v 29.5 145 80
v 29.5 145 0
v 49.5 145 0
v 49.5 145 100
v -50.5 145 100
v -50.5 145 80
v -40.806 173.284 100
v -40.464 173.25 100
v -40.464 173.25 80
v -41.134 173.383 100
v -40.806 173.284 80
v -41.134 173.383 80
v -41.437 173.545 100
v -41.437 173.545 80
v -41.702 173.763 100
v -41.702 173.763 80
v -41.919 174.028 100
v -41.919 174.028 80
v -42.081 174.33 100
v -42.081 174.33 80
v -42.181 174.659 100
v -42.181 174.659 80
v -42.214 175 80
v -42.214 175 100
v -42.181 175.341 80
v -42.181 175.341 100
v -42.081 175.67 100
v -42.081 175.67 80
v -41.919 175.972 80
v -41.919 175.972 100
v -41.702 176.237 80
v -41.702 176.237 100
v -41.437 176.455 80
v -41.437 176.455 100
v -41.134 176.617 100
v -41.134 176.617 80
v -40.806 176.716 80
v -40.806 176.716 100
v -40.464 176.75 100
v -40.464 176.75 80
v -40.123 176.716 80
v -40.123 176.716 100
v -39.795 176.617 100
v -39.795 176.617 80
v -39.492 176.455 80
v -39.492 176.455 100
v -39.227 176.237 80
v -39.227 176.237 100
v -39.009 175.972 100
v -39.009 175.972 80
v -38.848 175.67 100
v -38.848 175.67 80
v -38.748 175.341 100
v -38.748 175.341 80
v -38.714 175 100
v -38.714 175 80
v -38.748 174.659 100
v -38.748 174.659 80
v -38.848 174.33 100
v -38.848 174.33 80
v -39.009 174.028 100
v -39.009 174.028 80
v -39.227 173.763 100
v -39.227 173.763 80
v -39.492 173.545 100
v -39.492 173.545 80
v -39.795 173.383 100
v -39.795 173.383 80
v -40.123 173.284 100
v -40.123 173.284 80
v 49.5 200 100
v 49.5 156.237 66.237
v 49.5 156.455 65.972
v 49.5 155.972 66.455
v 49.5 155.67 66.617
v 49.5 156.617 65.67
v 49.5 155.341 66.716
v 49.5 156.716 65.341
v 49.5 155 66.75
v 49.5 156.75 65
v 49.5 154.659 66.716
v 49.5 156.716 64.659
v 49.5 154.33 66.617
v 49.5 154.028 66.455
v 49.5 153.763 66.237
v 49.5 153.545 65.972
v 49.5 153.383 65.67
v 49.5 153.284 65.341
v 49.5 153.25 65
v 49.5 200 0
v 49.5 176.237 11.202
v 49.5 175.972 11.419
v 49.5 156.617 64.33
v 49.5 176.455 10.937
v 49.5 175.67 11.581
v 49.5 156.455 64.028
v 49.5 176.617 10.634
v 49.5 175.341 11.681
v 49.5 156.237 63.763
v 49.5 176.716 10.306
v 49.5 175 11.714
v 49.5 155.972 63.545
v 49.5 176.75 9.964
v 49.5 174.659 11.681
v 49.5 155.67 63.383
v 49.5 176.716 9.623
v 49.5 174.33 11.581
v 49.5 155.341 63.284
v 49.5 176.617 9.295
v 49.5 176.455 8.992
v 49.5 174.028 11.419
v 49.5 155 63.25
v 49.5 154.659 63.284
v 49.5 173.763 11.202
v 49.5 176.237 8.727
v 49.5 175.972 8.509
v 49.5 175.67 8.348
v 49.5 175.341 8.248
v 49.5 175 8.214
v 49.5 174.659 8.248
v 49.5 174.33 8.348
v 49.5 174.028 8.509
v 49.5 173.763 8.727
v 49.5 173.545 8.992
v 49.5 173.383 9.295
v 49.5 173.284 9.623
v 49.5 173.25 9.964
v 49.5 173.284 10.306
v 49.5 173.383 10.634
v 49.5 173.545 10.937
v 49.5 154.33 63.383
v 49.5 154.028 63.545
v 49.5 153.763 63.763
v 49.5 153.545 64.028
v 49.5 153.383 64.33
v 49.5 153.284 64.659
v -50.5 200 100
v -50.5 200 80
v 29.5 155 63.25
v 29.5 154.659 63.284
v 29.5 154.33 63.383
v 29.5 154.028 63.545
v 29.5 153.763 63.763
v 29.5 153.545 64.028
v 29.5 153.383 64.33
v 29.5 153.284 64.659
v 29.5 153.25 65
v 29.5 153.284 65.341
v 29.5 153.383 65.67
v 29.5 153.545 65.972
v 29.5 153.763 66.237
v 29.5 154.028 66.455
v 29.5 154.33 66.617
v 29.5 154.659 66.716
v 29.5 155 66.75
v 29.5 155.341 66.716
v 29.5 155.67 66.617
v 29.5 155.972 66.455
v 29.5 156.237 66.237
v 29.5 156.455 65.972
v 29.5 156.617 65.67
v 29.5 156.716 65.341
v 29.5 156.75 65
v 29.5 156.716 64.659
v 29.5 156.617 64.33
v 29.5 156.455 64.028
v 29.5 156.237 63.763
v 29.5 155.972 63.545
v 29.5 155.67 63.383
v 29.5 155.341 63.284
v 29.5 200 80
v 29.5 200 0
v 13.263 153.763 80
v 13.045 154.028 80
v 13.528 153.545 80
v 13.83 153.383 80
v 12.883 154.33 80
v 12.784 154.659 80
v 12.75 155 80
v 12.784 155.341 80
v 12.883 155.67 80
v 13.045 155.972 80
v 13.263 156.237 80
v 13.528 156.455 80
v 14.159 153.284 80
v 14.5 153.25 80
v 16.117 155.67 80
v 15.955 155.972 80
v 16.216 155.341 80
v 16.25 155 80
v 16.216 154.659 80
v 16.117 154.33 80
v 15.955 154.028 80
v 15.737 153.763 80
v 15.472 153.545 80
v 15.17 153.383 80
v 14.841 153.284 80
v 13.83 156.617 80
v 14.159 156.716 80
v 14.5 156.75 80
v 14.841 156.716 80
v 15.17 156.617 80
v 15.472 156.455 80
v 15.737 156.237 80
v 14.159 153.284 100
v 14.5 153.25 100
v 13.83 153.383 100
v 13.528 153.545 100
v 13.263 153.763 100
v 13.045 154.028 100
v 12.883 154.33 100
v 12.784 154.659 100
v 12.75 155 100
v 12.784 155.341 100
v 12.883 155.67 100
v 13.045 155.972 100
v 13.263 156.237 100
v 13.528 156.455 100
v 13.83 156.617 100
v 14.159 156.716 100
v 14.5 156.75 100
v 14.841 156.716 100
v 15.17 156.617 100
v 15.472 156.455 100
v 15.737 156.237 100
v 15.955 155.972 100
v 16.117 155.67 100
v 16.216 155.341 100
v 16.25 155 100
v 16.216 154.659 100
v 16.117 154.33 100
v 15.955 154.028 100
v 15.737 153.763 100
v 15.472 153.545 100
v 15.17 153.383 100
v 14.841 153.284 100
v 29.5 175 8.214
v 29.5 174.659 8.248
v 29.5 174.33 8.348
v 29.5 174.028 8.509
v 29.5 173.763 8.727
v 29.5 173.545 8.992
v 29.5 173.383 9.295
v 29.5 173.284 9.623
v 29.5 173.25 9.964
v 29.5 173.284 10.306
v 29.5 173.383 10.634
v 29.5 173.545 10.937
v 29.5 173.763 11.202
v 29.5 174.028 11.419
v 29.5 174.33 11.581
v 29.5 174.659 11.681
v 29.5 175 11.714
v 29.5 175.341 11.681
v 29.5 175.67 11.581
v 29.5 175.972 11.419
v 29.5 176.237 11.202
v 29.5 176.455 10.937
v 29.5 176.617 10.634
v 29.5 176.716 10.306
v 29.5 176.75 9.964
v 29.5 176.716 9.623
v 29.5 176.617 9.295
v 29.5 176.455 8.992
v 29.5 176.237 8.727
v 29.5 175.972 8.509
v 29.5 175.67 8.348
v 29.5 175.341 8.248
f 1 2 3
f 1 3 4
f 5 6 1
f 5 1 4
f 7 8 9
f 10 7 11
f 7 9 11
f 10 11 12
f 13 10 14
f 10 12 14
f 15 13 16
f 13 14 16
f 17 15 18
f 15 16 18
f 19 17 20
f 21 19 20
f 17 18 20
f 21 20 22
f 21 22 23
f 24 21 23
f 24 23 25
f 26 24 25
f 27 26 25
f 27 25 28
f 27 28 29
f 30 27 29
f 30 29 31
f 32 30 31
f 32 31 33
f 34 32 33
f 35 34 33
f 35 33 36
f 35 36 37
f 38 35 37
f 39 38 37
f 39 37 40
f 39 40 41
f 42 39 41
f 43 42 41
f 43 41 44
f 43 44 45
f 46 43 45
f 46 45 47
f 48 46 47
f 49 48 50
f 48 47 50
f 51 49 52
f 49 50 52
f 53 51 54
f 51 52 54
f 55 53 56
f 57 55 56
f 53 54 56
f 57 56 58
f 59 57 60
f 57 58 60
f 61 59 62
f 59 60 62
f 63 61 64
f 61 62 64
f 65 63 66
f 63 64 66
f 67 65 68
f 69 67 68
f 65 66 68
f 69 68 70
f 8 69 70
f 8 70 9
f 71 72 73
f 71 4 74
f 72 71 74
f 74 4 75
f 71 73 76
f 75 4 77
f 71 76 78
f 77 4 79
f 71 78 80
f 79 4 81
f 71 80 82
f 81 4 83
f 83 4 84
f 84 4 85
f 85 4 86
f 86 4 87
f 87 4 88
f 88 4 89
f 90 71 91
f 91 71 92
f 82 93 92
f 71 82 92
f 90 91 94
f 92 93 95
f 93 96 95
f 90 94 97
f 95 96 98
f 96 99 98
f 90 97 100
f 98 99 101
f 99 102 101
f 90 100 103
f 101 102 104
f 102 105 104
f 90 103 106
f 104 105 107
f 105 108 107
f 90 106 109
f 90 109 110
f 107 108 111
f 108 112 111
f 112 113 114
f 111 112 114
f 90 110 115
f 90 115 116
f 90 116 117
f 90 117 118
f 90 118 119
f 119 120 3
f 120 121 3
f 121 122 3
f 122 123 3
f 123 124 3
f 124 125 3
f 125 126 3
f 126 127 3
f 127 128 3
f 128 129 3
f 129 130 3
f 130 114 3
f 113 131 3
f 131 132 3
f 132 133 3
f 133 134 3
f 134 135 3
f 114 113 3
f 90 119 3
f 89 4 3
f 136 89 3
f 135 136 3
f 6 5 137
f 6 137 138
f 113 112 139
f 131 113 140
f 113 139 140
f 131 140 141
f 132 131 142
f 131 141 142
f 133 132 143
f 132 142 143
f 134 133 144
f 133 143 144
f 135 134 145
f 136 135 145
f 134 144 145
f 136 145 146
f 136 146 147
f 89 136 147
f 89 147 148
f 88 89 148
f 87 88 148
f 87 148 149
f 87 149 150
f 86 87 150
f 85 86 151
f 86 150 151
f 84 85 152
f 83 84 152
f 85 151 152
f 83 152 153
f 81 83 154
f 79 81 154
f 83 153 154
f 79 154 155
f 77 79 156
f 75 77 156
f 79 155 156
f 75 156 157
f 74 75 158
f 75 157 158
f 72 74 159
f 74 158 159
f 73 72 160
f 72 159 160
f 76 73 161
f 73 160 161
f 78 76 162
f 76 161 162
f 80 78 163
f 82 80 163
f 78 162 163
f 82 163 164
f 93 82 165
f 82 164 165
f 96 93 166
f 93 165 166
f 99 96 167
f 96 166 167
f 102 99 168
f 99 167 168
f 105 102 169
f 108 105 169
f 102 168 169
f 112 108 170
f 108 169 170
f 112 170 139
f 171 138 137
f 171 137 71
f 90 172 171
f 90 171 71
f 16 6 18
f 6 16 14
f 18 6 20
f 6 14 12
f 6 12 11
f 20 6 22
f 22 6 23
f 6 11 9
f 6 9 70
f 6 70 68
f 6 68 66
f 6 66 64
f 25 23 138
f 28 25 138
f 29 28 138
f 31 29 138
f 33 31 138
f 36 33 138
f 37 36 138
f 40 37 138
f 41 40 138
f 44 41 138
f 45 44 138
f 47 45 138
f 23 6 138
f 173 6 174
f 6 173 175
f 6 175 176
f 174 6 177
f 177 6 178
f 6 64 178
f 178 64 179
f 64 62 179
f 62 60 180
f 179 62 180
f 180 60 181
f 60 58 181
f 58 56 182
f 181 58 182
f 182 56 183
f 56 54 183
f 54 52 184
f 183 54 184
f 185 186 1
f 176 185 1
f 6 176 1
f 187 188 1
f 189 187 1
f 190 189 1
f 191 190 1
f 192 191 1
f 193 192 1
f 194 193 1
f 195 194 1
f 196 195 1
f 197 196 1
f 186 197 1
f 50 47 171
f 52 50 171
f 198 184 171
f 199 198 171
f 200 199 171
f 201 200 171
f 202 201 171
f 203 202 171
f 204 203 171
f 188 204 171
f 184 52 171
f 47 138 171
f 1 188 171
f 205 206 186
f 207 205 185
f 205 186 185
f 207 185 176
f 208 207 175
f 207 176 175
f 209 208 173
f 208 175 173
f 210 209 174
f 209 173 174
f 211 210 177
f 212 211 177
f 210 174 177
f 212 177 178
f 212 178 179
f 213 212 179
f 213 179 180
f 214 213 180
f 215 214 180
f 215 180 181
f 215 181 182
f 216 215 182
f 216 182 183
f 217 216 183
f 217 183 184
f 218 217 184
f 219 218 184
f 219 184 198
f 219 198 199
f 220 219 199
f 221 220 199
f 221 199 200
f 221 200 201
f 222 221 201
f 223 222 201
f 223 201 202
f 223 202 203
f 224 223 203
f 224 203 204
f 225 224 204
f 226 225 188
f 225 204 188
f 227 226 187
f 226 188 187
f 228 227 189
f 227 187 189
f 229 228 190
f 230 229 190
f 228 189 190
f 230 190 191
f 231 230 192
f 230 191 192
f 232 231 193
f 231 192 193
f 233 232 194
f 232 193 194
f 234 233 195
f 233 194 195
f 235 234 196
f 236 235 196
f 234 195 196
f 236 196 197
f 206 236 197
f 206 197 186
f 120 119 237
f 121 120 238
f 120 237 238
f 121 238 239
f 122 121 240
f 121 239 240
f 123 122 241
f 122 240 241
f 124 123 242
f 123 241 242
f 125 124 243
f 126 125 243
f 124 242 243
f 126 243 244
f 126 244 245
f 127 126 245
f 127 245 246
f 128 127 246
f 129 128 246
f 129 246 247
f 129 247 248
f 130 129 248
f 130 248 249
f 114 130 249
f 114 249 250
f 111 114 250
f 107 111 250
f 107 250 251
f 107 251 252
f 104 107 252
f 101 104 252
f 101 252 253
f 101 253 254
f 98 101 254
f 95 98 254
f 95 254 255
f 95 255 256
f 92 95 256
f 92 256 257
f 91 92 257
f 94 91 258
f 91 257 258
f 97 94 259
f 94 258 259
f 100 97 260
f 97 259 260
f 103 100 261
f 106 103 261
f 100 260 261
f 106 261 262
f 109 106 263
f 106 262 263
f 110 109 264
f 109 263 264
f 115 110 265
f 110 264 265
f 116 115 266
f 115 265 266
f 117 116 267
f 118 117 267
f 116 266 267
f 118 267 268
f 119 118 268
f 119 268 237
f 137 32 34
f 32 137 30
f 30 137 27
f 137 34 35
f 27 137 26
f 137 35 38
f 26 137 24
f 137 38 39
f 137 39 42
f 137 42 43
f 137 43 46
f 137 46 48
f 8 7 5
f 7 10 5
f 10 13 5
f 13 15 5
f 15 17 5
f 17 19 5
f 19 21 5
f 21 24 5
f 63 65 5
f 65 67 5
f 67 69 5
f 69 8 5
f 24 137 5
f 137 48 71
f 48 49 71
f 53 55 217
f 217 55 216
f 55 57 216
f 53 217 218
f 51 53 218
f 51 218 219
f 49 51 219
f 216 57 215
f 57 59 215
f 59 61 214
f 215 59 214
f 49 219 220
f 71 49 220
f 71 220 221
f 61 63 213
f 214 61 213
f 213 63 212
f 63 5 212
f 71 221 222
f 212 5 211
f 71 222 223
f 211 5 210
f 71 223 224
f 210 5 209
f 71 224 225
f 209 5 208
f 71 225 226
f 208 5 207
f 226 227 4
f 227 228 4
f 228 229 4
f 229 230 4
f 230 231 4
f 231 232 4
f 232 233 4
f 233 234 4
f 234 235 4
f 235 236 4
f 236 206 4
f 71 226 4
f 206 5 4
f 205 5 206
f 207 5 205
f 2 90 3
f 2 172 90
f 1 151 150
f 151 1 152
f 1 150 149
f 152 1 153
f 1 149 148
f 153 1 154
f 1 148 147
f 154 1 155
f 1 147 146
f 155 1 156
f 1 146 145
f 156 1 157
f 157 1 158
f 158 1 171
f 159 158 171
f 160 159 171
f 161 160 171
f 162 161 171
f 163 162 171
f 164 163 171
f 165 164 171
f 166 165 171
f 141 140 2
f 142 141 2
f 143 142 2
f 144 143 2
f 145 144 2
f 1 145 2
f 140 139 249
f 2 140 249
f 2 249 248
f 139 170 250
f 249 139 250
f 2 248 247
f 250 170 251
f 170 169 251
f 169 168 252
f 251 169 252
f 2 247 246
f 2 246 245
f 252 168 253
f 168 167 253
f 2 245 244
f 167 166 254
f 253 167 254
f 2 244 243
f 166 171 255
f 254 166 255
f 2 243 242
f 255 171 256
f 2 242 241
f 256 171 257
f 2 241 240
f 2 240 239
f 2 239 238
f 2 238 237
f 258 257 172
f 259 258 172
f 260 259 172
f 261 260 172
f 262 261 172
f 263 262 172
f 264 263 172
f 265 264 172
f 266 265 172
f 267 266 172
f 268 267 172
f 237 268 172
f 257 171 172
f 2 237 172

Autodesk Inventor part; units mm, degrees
ref_plane "YZ Plane" through (0, 0, 0) normal (1, 0, 0) x (0, 1, 0)
ref_plane "XZ Plane" through (0, 0, 0) normal (0, 1, 0) x (-1, 0, 0)
ref_plane "XY Plane" through (0, 0, 0) normal (0, 0, 1) x (1, 0, 0)
sketch "Boceto2" plane through (0, 0, 0) normal (0, 1, 0) x (-1, 0, 0)
  line L0 (7.5, 100) -> (-7.5, 100)
  line L1 (-7.5, 100) -> (-7.5, -100)
  line L2 (-7.5, -100) -> (7.5, -100)
  line L3 (7.5, -100) -> (7.5, 100)
  line L4 (7.5, 100) -> (-7.5, -100) construction
  line L5 (-7.5, 100) -> (7.5, -100) construction
  point P0 (0, 0)
  dimension "d7" = 15
  dimension "d8" = 200
extrude "Extrusión1" add sketch "Boceto2" along normal blind 10
sketch "Boceto3" plane through (0, 10, 0) normal (0, 1, 0) x (1, 0, 0)
  circle A0 centre (3.25, 58.25) radius 1.75
  line L0 (5, 50) -> (-5, 50)
  line L1 (-5, 50) -> (-5, 60)
  line L2 (-5, 60) -> (5, 60)
  line L3 (5, 60) -> (5, 50)
  line L4 (5, 50) -> (-5, 60) construction
  line L5 (-5, 50) -> (5, 60) construction
  circle A1 centre (-3.25, 51.75) radius 1.75
  line L6 (7.5, 100) -> (-7.5, 100) projected
  line L7 (-7.5, 0) -> (3.408, 0)
  line L8 (5, -60) -> (5, -50)
  line L9 (-5, -60) -> (5, -60)
  line L10 (5, -50) -> (-5, -50)
  line L11 (-5, -50) -> (-5, -60)
  line L12 (-5, -50) -> (5, -60) construction
  circle A2 centre (-3.25, -51.75) radius 1.75
  line L13 (5, -50) -> (-5, -60) construction
  circle A3 centre (3.25, -58.25) radius 1.75
  line L14 (-7.5, -100) -> (7.5, -100) projected
  point P0 (0, 0)
  point P1 (-5, 55)
  point P2 (0, 100)
  point P3 (-5, -55)
  dimension "d11" = 3.5
  dimension "d12" = 1.75
  dimension "d13" = 1.75
  dimension "d14" = 1.75
  dimension "d15" = 1.75
  dimension "d16" = 10
  dimension "d17" = 10
  dimension "d19" = 40
  dimension "d81" = 40
hole "Agujero1" at (3.25, 10, 58.25) at (-3.25, 10, 51.75) at (3.25, 10, -58.25) at (-3.25, 10, -51.75) direction (0, -1, 0) diameter 3.5 end through all
sketch "Boceto4" plane through (0, 10, 0) normal (0, 1, 0) x (1, 0, 0)
  line L0 (-7.5, 100) -> (-7.5, -100) projected
  line L1 (-7.5, -100) -> (7.5, -100)
  line L2 (7.5, -100) -> (7.5, -80)
  line L3 (7.5, -80) -> (-7.5, -80)
  line L4 (-7.5, -80) -> (-7.5, -100)
  line L5 (-7.5, 0) -> (1.0116, 0)
  line L6 (-7.5, -100) -> (-7.5, 100)
  line L7 (-7.5, 100) -> (7.5, 100)
  line L8 (7.5, 100) -> (7.5, 80)
  line L9 (7.5, 80) -> (-7.5, 80)
  line L10 (-7.5, 80) -> (-7.5, 100)
  point P0 (0, 0)
  point P1 (-7.5, -80)
  point P2 (-7.5, 80)
  dimension "d27" = 15
  dimension "d28" = 20
extrude "Extrusión2" add sketch "Boceto4" along normal blind 80
sketch "Boceto5" plane through (0, 90, 0) normal (0, 1, 0) x (1, 0, 0)
  line L0 (-7.5, -100) -> (7.5, -100) projected
  line L1 (-7.5, -100) -> (49.5, -100)
  line L2 (49.5, -100) -> (49.5, 100)
  line L3 (49.5, 100) -> (-7.5, 100)
  line L4 (-7.5, 100) -> (-7.5, -100)
  line L5 (49.5, -100) -> (-150.5, -100)
  line L6 (-150.5, -100) -> (-150.5, 100)
  line L7 (-150.5, 100) -> (49.5, 100)
  line L8 (49.5, 100) -> (49.5, -100)
  point P0 (0, 0)
  point P1 (-7.5, 100)
  dimension "d31" = 57
  dimension "d32" = 200
  dimension "d75" = 200
extrude "Extrusión3" add sketch "Boceto5" along normal blind 110
sketch "Boceto6" plane through (0, 200, 0) normal (0, 1, 0) x (1, 0, 0)
  line L0 (49.5, 100) -> (7.5, 100) projected
  line L1 (49.5, 100) -> (29.5, 100)
  line L2 (29.5, 100) -> (29.5, 80)
  line L3 (7.5, -100) -> (49.5, -100) projected
  line L4 (28.5, -100) -> (28.5, -80)
  line L5 (-150.5, 100) -> (-150.5, -100) projected
  line L6 (29.5, 80) -> (-150.5, 80)
  line L7 (-150.5, 80) -> (-150.5, -80)
  line L8 (-150.5, -80) -> (29.5, -80)
  line L9 (29.5, -80) -> (29.5, 80)
  line L10 (-150.5, -100) -> (49.5, -100) projected
  point P0 (7.5, 80)
  point P1 (-50.5, -100)
  dimension "d36" = 20
  dimension "d37" = 20
  dimension "d38" = 20
  dimension "d77" = 20
extrude "Extrusión4" cut sketch "Boceto6" against normal blind 90 contours L8 L5 L6 L9
sketch "Boceto7" plane through (-150.5, 90, -100) normal (-1, 0, 0) x (0, 0, 1)
  line L0 (0, 110) -> (20, 110) projected
  line L1 (20, 110) -> (10, 110)
  line L2 (10, 110) -> (10, 20)
  line L3 (10, 20) -> (20, 20)
  line L4 (20, 20) -> (20, 110)
  line L5 (180, 110) -> (180, 20) projected
  line L6 (180, 110) -> (190, 110)
  line L7 (190, 110) -> (190, 20)
  line L8 (190, 20) -> (180, 20)
  line L9 (180, 20) -> (180, 110)
  line L10 (200, 0) -> (200, 110) projected
  line L11 (0, 0) -> (0, 110) projected
  line L12 (0, 110) -> (10, 110)
  line L13 (10, 110) -> (10, 20)
  line L14 (10, 20) -> (0, 20)
  line L15 (0, 20) -> (0, 110)
  line L16 (200, 110) -> (0, 110) projected
  line L17 (200, 110) -> (190, 110)
  line L18 (190, 110) -> (190, 20)
  line L19 (190, 20) -> (200, 20)
  line L20 (200, 20) -> (200, 110)
  point P0 (100, -90)
  dimension "d63" = 10
  dimension "d65" = 10
  dimension "d76" = 10
extrude "Extrusión5" cut sketch "Boceto7" against normal blind 30 contours L6 L7 L8 L5 | L0 L4 L3 L2
sketch "Boceto8" plane through (-7.5, 0, 100) normal (0, 0, 1) x (1, 0, 0)
  line L0 (-113, 110) -> (-113, 200) projected
  line L1 (-113, 200) -> (-113, 110)
  circle A0 centre (-124.75, 183.25) radius 1.75
  line L2 (-123, 175) -> (-133, 175)
  line L3 (-133, 175) -> (-133, 185)
  line L4 (-133, 185) -> (-123, 185)
  line L5 (-123, 185) -> (-123, 175)
  line L6 (-123, 175) -> (-133, 185) construction
  line L7 (-133, 175) -> (-123, 185) construction
  circle A1 centre (-131.25, 176.75) radius 1.75
  line L8 (-143, 200) -> (57, 200) projected
  line L9 (-143, 90) -> (-143, 200) projected
  line L10 (-113, 155) -> (-128, 155)
  line L11 (-123, 125) -> (-123, 135)
  line L12 (-133, 125) -> (-123, 125)
  line L13 (-123, 135) -> (-133, 125) construction
  line L14 (-123, 135) -> (-133, 135)
  line L15 (-133, 135) -> (-123, 125) construction
  circle A2 centre (-131.25, 133.25) radius 1.75
  line L16 (-133, 135) -> (-133, 125)
  circle A3 centre (-124.75, 126.75) radius 1.75
  line L17 (-143, 110) -> (-113, 110) projected
  point P0 (7.5, 0)
  point P1 (-133, 180)
  point P2 (-123, 180)
  point P3 (-133, 130)
  point P4 (-123, 130)
  dimension "d45" = 3.5
  dimension "d46" = 1.75
  dimension "d47" = 1.75
  dimension "d48" = 1.75
  dimension "d49" = 1.75
  dimension "d50" = 10
  dimension "d51" = 10
  dimension "d52" = 15
  dimension "d53" = 10
  dimension "d54" = 10
  dimension "d55" = 15
hole "Agujero2" at (-132.25, 183.25, 100) at (-138.75, 176.75, 100) at (-138.75, 133.25, 100) at (-132.25, 126.75, 100) direction (0, 0, -1) diameter 3.5 end through all
ref_plane "Plano de trabajo1" through (-150.5, 90, 100) normal (0, -1, 0) x (1, 0, 0)
split "Dividir1" plane through (-150.5, 90, 100) removes the side toward (0, -1, 0)
ref_plane "Plano de trabajo2" through (49.5, 90, 0) normal (0, 0, -1) x (-1, 0, 0)
ref_plane "Plano de trabajo3" through (-50.5, 90, 100) normal (1, 0, 0) x (0, 0, -1)
ref_plane "Plano de trabajo4" through (0, 145, 0) normal (0, 1, 0) x (1, 0, 0)
sketch "Boceto9" plane through (-150.5, 90, 100) normal (0, 0, 1) x (1, 0, 0)
  line L0 (85.0357, 30) -> (115.0357, 30)
  circle A0 centre (110.0357, 25) radius 1.75
  line L1 (90.0357, 25) -> (110.0357, 25)
  line L2 (115.0357, 30) -> (115.0357, 20)
  circle A1 centre (90.0357, 25) radius 1.75
  line L3 (85.0357, 20) -> (115.0357, 30) construction
  line L4 (85.0357, 30) -> (115.0357, 20) construction
  line L5 (85.0357, 20) -> (85.0357, 30)
  line L6 (115.0357, 20) -> (85.0357, 20)
  line L7 (200, 0) -> (200, 110)
  line L8 (200, 55) -> (88.2857, 55)
  circle A2 centre (90.0357, 85) radius 1.75
  line L9 (85.0357, 80) -> (115.0357, 80)
  line L10 (85.0357, 80) -> (115.0357, 90) construction
  line L11 (85.0357, 90) -> (85.0357, 80)
  line L12 (115.0357, 90) -> (85.0357, 90)
  line L13 (85.0357, 90) -> (115.0357, 80) construction
  circle A3 centre (110.0357, 85) radius 1.75
  line L14 (90.0357, 85) -> (110.0357, 85)
  line L15 (115.0357, 80) -> (115.0357, 90)
  line L16 (100.0357, 55) -> (185.099, 55) construction
  line L17 (160, 70) -> (160, 40)
  circle A4 centre (165, 45) radius 1.75
  line L18 (170, 40) -> (170, 70)
  line L19 (170, 70) -> (160, 40) construction
  line L20 (160, 40) -> (170, 40)
  line L21 (160, 70) -> (170, 40) construction
  circle A5 centre (165, 65) radius 1.75
  line L22 (165, 65) -> (165, 45)
  line L23 (170, 70) -> (160, 70)
  circle A6 centre (55, 65) radius 1.75
  line L24 (60, 70) -> (60, 40)
  line L25 (60, 40) -> (50, 40)
  circle A7 centre (55, 45) radius 1.75
  line L26 (55, 65) -> (55, 45)
  line L27 (60, 70) -> (50, 40) construction
  line L28 (50, 40) -> (50, 70)
  line L29 (50, 70) -> (60, 40) construction
  line L30 (50, 70) -> (60, 70)
  line L31 (30, 110) -> (30, 20)
  point P0 (150.5, -90)
  point P1 (100.0357, 34.7141)
  point P2 (100.0357, 34.7141)
  point P3 (85.0357, 36.6749)
  point P4 (115.0357, 25)
  point P5 (115.0357, 85)
  point P6 (189.1833, 40)
  point P7 (165, 70)
  point P8 (70.0357, 40)
  point P9 (55, 70)
  dimension "d89" = 10
  dimension "d90" = 30
  dimension "d91" = 5
  dimension "d92" = 5
  dimension "d93" = 5
  dimension "d94" = 5
  dimension "d95" = 30
  dimension "d96" = 5
  dimension "d97" = 5
  dimension "d98" = 3.5
  dimension "d99" = 5
  dimension "d100" = 5
  dimension "d101" = 5
  dimension "d102" = 5
  dimension "d103" = 5
  dimension "d104" = 20
hole "Agujero3" at (-60.4643, 175, 100) at (-40.4643, 175, 100) at (14.5, 155, 100) at (-95.5, 155, 100) at (-95.5, 135, 100) at (-60.4643, 115, 100) at (-40.4643, 115, 100) at (14.5, 135, 100) direction (0, 0, -1) diameter 3.5 end through all
sketch "Boceto10" plane through (49.5, 90, 100) normal (1, 0, 0) x (0, 0, -1)
  line L0 (85.0357, 30) -> (115.0357, 30)
  circle A0 centre (110.0357, 25) radius 1.75
  line L1 (90.0357, 25) -> (110.0357, 25)
  line L2 (115.0357, 30) -> (115.0357, 20)
  circle A1 centre (90.0357, 25) radius 1.75
  line L3 (85.0357, 30) -> (115.0357, 20) construction
  line L4 (85.0357, 20) -> (85.0357, 30)
  line L5 (115.0357, 20) -> (85.0357, 20)
  line L6 (85.0357, 20) -> (115.0357, 30) construction
  line L7 (160, 70) -> (160, 40)
  circle A2 centre (165, 45) radius 1.75
  line L8 (160, 40) -> (170, 40)
  line L9 (165, 65) -> (165, 45)
  circle A3 centre (165, 65) radius 1.75
  line L10 (170, 70) -> (160, 40) construction
  line L11 (170, 70) -> (160, 70)
  line L12 (160, 70) -> (170, 40) construction
  line L13 (170, 40) -> (170, 70)
  line L14 (40, 70) -> (40, 40)
  line L15 (35, 65) -> (35, 45)
  circle A4 centre (35, 65) radius 1.75
  line L16 (40, 40) -> (30, 40)
  line L17 (40, 70) -> (30, 40) construction
  line L18 (30, 70) -> (40, 40) construction
  line L19 (30, 70) -> (40, 70)
  line L20 (30, 40) -> (30, 70)
  circle A5 centre (35, 45) radius 1.75
  circle A6 centre (90.0357, 85) radius 1.75
  line L21 (85.0357, 80) -> (115.0357, 80)
  line L22 (115.0357, 80) -> (115.0357, 90)
  circle A7 centre (110.0357, 85) radius 1.75
  line L23 (90.0357, 85) -> (110.0357, 85)
  line L24 (85.0357, 80) -> (115.0357, 90) construction
  line L25 (85.0357, 90) -> (85.0357, 80)
  line L26 (115.0357, 90) -> (85.0357, 90)
  line L27 (85.0357, 90) -> (115.0357, 80) construction
  line L28 (0, 0) -> (0, 110)
  line L29 (200, 0) -> (200, 110)
  point P0 (100, -90)
  point P1 (100.0357, 34.7141)
  point P2 (100.0357, 34.7141)
  point P3 (85.0357, 36.6749)
  point P4 (115.0357, 25)
  point P5 (88.2857, 55)
  point P6 (189.1833, 40)
  point P7 (165, 70)
  point P8 (70.0357, 40)
  point P9 (35, 70)
  point P10 (115.0357, 85)
  point P11 (100.0357, 55)
  dimension "d112" = 10
  dimension "d113" = 30
  dimension "d114" = 5
  dimension "d115" = 5
  dimension "d116" = 5
  dimension "d117" = 5
  dimension "d118" = 5
  dimension "d119" = 5
  dimension "d120" = 3.5
  dimension "d121" = 5
  dimension "d122" = 5
  dimension "d123" = 5
  dimension "d124" = 5
  dimension "d125" = 5
  dimension "d126" = 30
  dimension "d127" = 30
hole "Agujero4" at (49.5, 175, 9.9643) at (49.5, 175, -10.0357) at (49.5, 155, 65) at (49.5, 135, 65) at (49.5, 115, 9.9643) at (49.5, 115, -10.0357) at (49.5, 135, -65) at (49.5, 155, -65) direction (-1, 0, 0) diameter 3.5 end through all
split "Dividir2" plane through (-50.5, 90, 100) removes the side toward (-1, 0, 0)
split "Dividir3" plane through (0, 145, 0) removes the side toward (0, -1, 0)
split "Dividir4" plane through (49.5, 90, 0) removes the side toward (0, 0, -1)
properties part number "container_front_head_6"
